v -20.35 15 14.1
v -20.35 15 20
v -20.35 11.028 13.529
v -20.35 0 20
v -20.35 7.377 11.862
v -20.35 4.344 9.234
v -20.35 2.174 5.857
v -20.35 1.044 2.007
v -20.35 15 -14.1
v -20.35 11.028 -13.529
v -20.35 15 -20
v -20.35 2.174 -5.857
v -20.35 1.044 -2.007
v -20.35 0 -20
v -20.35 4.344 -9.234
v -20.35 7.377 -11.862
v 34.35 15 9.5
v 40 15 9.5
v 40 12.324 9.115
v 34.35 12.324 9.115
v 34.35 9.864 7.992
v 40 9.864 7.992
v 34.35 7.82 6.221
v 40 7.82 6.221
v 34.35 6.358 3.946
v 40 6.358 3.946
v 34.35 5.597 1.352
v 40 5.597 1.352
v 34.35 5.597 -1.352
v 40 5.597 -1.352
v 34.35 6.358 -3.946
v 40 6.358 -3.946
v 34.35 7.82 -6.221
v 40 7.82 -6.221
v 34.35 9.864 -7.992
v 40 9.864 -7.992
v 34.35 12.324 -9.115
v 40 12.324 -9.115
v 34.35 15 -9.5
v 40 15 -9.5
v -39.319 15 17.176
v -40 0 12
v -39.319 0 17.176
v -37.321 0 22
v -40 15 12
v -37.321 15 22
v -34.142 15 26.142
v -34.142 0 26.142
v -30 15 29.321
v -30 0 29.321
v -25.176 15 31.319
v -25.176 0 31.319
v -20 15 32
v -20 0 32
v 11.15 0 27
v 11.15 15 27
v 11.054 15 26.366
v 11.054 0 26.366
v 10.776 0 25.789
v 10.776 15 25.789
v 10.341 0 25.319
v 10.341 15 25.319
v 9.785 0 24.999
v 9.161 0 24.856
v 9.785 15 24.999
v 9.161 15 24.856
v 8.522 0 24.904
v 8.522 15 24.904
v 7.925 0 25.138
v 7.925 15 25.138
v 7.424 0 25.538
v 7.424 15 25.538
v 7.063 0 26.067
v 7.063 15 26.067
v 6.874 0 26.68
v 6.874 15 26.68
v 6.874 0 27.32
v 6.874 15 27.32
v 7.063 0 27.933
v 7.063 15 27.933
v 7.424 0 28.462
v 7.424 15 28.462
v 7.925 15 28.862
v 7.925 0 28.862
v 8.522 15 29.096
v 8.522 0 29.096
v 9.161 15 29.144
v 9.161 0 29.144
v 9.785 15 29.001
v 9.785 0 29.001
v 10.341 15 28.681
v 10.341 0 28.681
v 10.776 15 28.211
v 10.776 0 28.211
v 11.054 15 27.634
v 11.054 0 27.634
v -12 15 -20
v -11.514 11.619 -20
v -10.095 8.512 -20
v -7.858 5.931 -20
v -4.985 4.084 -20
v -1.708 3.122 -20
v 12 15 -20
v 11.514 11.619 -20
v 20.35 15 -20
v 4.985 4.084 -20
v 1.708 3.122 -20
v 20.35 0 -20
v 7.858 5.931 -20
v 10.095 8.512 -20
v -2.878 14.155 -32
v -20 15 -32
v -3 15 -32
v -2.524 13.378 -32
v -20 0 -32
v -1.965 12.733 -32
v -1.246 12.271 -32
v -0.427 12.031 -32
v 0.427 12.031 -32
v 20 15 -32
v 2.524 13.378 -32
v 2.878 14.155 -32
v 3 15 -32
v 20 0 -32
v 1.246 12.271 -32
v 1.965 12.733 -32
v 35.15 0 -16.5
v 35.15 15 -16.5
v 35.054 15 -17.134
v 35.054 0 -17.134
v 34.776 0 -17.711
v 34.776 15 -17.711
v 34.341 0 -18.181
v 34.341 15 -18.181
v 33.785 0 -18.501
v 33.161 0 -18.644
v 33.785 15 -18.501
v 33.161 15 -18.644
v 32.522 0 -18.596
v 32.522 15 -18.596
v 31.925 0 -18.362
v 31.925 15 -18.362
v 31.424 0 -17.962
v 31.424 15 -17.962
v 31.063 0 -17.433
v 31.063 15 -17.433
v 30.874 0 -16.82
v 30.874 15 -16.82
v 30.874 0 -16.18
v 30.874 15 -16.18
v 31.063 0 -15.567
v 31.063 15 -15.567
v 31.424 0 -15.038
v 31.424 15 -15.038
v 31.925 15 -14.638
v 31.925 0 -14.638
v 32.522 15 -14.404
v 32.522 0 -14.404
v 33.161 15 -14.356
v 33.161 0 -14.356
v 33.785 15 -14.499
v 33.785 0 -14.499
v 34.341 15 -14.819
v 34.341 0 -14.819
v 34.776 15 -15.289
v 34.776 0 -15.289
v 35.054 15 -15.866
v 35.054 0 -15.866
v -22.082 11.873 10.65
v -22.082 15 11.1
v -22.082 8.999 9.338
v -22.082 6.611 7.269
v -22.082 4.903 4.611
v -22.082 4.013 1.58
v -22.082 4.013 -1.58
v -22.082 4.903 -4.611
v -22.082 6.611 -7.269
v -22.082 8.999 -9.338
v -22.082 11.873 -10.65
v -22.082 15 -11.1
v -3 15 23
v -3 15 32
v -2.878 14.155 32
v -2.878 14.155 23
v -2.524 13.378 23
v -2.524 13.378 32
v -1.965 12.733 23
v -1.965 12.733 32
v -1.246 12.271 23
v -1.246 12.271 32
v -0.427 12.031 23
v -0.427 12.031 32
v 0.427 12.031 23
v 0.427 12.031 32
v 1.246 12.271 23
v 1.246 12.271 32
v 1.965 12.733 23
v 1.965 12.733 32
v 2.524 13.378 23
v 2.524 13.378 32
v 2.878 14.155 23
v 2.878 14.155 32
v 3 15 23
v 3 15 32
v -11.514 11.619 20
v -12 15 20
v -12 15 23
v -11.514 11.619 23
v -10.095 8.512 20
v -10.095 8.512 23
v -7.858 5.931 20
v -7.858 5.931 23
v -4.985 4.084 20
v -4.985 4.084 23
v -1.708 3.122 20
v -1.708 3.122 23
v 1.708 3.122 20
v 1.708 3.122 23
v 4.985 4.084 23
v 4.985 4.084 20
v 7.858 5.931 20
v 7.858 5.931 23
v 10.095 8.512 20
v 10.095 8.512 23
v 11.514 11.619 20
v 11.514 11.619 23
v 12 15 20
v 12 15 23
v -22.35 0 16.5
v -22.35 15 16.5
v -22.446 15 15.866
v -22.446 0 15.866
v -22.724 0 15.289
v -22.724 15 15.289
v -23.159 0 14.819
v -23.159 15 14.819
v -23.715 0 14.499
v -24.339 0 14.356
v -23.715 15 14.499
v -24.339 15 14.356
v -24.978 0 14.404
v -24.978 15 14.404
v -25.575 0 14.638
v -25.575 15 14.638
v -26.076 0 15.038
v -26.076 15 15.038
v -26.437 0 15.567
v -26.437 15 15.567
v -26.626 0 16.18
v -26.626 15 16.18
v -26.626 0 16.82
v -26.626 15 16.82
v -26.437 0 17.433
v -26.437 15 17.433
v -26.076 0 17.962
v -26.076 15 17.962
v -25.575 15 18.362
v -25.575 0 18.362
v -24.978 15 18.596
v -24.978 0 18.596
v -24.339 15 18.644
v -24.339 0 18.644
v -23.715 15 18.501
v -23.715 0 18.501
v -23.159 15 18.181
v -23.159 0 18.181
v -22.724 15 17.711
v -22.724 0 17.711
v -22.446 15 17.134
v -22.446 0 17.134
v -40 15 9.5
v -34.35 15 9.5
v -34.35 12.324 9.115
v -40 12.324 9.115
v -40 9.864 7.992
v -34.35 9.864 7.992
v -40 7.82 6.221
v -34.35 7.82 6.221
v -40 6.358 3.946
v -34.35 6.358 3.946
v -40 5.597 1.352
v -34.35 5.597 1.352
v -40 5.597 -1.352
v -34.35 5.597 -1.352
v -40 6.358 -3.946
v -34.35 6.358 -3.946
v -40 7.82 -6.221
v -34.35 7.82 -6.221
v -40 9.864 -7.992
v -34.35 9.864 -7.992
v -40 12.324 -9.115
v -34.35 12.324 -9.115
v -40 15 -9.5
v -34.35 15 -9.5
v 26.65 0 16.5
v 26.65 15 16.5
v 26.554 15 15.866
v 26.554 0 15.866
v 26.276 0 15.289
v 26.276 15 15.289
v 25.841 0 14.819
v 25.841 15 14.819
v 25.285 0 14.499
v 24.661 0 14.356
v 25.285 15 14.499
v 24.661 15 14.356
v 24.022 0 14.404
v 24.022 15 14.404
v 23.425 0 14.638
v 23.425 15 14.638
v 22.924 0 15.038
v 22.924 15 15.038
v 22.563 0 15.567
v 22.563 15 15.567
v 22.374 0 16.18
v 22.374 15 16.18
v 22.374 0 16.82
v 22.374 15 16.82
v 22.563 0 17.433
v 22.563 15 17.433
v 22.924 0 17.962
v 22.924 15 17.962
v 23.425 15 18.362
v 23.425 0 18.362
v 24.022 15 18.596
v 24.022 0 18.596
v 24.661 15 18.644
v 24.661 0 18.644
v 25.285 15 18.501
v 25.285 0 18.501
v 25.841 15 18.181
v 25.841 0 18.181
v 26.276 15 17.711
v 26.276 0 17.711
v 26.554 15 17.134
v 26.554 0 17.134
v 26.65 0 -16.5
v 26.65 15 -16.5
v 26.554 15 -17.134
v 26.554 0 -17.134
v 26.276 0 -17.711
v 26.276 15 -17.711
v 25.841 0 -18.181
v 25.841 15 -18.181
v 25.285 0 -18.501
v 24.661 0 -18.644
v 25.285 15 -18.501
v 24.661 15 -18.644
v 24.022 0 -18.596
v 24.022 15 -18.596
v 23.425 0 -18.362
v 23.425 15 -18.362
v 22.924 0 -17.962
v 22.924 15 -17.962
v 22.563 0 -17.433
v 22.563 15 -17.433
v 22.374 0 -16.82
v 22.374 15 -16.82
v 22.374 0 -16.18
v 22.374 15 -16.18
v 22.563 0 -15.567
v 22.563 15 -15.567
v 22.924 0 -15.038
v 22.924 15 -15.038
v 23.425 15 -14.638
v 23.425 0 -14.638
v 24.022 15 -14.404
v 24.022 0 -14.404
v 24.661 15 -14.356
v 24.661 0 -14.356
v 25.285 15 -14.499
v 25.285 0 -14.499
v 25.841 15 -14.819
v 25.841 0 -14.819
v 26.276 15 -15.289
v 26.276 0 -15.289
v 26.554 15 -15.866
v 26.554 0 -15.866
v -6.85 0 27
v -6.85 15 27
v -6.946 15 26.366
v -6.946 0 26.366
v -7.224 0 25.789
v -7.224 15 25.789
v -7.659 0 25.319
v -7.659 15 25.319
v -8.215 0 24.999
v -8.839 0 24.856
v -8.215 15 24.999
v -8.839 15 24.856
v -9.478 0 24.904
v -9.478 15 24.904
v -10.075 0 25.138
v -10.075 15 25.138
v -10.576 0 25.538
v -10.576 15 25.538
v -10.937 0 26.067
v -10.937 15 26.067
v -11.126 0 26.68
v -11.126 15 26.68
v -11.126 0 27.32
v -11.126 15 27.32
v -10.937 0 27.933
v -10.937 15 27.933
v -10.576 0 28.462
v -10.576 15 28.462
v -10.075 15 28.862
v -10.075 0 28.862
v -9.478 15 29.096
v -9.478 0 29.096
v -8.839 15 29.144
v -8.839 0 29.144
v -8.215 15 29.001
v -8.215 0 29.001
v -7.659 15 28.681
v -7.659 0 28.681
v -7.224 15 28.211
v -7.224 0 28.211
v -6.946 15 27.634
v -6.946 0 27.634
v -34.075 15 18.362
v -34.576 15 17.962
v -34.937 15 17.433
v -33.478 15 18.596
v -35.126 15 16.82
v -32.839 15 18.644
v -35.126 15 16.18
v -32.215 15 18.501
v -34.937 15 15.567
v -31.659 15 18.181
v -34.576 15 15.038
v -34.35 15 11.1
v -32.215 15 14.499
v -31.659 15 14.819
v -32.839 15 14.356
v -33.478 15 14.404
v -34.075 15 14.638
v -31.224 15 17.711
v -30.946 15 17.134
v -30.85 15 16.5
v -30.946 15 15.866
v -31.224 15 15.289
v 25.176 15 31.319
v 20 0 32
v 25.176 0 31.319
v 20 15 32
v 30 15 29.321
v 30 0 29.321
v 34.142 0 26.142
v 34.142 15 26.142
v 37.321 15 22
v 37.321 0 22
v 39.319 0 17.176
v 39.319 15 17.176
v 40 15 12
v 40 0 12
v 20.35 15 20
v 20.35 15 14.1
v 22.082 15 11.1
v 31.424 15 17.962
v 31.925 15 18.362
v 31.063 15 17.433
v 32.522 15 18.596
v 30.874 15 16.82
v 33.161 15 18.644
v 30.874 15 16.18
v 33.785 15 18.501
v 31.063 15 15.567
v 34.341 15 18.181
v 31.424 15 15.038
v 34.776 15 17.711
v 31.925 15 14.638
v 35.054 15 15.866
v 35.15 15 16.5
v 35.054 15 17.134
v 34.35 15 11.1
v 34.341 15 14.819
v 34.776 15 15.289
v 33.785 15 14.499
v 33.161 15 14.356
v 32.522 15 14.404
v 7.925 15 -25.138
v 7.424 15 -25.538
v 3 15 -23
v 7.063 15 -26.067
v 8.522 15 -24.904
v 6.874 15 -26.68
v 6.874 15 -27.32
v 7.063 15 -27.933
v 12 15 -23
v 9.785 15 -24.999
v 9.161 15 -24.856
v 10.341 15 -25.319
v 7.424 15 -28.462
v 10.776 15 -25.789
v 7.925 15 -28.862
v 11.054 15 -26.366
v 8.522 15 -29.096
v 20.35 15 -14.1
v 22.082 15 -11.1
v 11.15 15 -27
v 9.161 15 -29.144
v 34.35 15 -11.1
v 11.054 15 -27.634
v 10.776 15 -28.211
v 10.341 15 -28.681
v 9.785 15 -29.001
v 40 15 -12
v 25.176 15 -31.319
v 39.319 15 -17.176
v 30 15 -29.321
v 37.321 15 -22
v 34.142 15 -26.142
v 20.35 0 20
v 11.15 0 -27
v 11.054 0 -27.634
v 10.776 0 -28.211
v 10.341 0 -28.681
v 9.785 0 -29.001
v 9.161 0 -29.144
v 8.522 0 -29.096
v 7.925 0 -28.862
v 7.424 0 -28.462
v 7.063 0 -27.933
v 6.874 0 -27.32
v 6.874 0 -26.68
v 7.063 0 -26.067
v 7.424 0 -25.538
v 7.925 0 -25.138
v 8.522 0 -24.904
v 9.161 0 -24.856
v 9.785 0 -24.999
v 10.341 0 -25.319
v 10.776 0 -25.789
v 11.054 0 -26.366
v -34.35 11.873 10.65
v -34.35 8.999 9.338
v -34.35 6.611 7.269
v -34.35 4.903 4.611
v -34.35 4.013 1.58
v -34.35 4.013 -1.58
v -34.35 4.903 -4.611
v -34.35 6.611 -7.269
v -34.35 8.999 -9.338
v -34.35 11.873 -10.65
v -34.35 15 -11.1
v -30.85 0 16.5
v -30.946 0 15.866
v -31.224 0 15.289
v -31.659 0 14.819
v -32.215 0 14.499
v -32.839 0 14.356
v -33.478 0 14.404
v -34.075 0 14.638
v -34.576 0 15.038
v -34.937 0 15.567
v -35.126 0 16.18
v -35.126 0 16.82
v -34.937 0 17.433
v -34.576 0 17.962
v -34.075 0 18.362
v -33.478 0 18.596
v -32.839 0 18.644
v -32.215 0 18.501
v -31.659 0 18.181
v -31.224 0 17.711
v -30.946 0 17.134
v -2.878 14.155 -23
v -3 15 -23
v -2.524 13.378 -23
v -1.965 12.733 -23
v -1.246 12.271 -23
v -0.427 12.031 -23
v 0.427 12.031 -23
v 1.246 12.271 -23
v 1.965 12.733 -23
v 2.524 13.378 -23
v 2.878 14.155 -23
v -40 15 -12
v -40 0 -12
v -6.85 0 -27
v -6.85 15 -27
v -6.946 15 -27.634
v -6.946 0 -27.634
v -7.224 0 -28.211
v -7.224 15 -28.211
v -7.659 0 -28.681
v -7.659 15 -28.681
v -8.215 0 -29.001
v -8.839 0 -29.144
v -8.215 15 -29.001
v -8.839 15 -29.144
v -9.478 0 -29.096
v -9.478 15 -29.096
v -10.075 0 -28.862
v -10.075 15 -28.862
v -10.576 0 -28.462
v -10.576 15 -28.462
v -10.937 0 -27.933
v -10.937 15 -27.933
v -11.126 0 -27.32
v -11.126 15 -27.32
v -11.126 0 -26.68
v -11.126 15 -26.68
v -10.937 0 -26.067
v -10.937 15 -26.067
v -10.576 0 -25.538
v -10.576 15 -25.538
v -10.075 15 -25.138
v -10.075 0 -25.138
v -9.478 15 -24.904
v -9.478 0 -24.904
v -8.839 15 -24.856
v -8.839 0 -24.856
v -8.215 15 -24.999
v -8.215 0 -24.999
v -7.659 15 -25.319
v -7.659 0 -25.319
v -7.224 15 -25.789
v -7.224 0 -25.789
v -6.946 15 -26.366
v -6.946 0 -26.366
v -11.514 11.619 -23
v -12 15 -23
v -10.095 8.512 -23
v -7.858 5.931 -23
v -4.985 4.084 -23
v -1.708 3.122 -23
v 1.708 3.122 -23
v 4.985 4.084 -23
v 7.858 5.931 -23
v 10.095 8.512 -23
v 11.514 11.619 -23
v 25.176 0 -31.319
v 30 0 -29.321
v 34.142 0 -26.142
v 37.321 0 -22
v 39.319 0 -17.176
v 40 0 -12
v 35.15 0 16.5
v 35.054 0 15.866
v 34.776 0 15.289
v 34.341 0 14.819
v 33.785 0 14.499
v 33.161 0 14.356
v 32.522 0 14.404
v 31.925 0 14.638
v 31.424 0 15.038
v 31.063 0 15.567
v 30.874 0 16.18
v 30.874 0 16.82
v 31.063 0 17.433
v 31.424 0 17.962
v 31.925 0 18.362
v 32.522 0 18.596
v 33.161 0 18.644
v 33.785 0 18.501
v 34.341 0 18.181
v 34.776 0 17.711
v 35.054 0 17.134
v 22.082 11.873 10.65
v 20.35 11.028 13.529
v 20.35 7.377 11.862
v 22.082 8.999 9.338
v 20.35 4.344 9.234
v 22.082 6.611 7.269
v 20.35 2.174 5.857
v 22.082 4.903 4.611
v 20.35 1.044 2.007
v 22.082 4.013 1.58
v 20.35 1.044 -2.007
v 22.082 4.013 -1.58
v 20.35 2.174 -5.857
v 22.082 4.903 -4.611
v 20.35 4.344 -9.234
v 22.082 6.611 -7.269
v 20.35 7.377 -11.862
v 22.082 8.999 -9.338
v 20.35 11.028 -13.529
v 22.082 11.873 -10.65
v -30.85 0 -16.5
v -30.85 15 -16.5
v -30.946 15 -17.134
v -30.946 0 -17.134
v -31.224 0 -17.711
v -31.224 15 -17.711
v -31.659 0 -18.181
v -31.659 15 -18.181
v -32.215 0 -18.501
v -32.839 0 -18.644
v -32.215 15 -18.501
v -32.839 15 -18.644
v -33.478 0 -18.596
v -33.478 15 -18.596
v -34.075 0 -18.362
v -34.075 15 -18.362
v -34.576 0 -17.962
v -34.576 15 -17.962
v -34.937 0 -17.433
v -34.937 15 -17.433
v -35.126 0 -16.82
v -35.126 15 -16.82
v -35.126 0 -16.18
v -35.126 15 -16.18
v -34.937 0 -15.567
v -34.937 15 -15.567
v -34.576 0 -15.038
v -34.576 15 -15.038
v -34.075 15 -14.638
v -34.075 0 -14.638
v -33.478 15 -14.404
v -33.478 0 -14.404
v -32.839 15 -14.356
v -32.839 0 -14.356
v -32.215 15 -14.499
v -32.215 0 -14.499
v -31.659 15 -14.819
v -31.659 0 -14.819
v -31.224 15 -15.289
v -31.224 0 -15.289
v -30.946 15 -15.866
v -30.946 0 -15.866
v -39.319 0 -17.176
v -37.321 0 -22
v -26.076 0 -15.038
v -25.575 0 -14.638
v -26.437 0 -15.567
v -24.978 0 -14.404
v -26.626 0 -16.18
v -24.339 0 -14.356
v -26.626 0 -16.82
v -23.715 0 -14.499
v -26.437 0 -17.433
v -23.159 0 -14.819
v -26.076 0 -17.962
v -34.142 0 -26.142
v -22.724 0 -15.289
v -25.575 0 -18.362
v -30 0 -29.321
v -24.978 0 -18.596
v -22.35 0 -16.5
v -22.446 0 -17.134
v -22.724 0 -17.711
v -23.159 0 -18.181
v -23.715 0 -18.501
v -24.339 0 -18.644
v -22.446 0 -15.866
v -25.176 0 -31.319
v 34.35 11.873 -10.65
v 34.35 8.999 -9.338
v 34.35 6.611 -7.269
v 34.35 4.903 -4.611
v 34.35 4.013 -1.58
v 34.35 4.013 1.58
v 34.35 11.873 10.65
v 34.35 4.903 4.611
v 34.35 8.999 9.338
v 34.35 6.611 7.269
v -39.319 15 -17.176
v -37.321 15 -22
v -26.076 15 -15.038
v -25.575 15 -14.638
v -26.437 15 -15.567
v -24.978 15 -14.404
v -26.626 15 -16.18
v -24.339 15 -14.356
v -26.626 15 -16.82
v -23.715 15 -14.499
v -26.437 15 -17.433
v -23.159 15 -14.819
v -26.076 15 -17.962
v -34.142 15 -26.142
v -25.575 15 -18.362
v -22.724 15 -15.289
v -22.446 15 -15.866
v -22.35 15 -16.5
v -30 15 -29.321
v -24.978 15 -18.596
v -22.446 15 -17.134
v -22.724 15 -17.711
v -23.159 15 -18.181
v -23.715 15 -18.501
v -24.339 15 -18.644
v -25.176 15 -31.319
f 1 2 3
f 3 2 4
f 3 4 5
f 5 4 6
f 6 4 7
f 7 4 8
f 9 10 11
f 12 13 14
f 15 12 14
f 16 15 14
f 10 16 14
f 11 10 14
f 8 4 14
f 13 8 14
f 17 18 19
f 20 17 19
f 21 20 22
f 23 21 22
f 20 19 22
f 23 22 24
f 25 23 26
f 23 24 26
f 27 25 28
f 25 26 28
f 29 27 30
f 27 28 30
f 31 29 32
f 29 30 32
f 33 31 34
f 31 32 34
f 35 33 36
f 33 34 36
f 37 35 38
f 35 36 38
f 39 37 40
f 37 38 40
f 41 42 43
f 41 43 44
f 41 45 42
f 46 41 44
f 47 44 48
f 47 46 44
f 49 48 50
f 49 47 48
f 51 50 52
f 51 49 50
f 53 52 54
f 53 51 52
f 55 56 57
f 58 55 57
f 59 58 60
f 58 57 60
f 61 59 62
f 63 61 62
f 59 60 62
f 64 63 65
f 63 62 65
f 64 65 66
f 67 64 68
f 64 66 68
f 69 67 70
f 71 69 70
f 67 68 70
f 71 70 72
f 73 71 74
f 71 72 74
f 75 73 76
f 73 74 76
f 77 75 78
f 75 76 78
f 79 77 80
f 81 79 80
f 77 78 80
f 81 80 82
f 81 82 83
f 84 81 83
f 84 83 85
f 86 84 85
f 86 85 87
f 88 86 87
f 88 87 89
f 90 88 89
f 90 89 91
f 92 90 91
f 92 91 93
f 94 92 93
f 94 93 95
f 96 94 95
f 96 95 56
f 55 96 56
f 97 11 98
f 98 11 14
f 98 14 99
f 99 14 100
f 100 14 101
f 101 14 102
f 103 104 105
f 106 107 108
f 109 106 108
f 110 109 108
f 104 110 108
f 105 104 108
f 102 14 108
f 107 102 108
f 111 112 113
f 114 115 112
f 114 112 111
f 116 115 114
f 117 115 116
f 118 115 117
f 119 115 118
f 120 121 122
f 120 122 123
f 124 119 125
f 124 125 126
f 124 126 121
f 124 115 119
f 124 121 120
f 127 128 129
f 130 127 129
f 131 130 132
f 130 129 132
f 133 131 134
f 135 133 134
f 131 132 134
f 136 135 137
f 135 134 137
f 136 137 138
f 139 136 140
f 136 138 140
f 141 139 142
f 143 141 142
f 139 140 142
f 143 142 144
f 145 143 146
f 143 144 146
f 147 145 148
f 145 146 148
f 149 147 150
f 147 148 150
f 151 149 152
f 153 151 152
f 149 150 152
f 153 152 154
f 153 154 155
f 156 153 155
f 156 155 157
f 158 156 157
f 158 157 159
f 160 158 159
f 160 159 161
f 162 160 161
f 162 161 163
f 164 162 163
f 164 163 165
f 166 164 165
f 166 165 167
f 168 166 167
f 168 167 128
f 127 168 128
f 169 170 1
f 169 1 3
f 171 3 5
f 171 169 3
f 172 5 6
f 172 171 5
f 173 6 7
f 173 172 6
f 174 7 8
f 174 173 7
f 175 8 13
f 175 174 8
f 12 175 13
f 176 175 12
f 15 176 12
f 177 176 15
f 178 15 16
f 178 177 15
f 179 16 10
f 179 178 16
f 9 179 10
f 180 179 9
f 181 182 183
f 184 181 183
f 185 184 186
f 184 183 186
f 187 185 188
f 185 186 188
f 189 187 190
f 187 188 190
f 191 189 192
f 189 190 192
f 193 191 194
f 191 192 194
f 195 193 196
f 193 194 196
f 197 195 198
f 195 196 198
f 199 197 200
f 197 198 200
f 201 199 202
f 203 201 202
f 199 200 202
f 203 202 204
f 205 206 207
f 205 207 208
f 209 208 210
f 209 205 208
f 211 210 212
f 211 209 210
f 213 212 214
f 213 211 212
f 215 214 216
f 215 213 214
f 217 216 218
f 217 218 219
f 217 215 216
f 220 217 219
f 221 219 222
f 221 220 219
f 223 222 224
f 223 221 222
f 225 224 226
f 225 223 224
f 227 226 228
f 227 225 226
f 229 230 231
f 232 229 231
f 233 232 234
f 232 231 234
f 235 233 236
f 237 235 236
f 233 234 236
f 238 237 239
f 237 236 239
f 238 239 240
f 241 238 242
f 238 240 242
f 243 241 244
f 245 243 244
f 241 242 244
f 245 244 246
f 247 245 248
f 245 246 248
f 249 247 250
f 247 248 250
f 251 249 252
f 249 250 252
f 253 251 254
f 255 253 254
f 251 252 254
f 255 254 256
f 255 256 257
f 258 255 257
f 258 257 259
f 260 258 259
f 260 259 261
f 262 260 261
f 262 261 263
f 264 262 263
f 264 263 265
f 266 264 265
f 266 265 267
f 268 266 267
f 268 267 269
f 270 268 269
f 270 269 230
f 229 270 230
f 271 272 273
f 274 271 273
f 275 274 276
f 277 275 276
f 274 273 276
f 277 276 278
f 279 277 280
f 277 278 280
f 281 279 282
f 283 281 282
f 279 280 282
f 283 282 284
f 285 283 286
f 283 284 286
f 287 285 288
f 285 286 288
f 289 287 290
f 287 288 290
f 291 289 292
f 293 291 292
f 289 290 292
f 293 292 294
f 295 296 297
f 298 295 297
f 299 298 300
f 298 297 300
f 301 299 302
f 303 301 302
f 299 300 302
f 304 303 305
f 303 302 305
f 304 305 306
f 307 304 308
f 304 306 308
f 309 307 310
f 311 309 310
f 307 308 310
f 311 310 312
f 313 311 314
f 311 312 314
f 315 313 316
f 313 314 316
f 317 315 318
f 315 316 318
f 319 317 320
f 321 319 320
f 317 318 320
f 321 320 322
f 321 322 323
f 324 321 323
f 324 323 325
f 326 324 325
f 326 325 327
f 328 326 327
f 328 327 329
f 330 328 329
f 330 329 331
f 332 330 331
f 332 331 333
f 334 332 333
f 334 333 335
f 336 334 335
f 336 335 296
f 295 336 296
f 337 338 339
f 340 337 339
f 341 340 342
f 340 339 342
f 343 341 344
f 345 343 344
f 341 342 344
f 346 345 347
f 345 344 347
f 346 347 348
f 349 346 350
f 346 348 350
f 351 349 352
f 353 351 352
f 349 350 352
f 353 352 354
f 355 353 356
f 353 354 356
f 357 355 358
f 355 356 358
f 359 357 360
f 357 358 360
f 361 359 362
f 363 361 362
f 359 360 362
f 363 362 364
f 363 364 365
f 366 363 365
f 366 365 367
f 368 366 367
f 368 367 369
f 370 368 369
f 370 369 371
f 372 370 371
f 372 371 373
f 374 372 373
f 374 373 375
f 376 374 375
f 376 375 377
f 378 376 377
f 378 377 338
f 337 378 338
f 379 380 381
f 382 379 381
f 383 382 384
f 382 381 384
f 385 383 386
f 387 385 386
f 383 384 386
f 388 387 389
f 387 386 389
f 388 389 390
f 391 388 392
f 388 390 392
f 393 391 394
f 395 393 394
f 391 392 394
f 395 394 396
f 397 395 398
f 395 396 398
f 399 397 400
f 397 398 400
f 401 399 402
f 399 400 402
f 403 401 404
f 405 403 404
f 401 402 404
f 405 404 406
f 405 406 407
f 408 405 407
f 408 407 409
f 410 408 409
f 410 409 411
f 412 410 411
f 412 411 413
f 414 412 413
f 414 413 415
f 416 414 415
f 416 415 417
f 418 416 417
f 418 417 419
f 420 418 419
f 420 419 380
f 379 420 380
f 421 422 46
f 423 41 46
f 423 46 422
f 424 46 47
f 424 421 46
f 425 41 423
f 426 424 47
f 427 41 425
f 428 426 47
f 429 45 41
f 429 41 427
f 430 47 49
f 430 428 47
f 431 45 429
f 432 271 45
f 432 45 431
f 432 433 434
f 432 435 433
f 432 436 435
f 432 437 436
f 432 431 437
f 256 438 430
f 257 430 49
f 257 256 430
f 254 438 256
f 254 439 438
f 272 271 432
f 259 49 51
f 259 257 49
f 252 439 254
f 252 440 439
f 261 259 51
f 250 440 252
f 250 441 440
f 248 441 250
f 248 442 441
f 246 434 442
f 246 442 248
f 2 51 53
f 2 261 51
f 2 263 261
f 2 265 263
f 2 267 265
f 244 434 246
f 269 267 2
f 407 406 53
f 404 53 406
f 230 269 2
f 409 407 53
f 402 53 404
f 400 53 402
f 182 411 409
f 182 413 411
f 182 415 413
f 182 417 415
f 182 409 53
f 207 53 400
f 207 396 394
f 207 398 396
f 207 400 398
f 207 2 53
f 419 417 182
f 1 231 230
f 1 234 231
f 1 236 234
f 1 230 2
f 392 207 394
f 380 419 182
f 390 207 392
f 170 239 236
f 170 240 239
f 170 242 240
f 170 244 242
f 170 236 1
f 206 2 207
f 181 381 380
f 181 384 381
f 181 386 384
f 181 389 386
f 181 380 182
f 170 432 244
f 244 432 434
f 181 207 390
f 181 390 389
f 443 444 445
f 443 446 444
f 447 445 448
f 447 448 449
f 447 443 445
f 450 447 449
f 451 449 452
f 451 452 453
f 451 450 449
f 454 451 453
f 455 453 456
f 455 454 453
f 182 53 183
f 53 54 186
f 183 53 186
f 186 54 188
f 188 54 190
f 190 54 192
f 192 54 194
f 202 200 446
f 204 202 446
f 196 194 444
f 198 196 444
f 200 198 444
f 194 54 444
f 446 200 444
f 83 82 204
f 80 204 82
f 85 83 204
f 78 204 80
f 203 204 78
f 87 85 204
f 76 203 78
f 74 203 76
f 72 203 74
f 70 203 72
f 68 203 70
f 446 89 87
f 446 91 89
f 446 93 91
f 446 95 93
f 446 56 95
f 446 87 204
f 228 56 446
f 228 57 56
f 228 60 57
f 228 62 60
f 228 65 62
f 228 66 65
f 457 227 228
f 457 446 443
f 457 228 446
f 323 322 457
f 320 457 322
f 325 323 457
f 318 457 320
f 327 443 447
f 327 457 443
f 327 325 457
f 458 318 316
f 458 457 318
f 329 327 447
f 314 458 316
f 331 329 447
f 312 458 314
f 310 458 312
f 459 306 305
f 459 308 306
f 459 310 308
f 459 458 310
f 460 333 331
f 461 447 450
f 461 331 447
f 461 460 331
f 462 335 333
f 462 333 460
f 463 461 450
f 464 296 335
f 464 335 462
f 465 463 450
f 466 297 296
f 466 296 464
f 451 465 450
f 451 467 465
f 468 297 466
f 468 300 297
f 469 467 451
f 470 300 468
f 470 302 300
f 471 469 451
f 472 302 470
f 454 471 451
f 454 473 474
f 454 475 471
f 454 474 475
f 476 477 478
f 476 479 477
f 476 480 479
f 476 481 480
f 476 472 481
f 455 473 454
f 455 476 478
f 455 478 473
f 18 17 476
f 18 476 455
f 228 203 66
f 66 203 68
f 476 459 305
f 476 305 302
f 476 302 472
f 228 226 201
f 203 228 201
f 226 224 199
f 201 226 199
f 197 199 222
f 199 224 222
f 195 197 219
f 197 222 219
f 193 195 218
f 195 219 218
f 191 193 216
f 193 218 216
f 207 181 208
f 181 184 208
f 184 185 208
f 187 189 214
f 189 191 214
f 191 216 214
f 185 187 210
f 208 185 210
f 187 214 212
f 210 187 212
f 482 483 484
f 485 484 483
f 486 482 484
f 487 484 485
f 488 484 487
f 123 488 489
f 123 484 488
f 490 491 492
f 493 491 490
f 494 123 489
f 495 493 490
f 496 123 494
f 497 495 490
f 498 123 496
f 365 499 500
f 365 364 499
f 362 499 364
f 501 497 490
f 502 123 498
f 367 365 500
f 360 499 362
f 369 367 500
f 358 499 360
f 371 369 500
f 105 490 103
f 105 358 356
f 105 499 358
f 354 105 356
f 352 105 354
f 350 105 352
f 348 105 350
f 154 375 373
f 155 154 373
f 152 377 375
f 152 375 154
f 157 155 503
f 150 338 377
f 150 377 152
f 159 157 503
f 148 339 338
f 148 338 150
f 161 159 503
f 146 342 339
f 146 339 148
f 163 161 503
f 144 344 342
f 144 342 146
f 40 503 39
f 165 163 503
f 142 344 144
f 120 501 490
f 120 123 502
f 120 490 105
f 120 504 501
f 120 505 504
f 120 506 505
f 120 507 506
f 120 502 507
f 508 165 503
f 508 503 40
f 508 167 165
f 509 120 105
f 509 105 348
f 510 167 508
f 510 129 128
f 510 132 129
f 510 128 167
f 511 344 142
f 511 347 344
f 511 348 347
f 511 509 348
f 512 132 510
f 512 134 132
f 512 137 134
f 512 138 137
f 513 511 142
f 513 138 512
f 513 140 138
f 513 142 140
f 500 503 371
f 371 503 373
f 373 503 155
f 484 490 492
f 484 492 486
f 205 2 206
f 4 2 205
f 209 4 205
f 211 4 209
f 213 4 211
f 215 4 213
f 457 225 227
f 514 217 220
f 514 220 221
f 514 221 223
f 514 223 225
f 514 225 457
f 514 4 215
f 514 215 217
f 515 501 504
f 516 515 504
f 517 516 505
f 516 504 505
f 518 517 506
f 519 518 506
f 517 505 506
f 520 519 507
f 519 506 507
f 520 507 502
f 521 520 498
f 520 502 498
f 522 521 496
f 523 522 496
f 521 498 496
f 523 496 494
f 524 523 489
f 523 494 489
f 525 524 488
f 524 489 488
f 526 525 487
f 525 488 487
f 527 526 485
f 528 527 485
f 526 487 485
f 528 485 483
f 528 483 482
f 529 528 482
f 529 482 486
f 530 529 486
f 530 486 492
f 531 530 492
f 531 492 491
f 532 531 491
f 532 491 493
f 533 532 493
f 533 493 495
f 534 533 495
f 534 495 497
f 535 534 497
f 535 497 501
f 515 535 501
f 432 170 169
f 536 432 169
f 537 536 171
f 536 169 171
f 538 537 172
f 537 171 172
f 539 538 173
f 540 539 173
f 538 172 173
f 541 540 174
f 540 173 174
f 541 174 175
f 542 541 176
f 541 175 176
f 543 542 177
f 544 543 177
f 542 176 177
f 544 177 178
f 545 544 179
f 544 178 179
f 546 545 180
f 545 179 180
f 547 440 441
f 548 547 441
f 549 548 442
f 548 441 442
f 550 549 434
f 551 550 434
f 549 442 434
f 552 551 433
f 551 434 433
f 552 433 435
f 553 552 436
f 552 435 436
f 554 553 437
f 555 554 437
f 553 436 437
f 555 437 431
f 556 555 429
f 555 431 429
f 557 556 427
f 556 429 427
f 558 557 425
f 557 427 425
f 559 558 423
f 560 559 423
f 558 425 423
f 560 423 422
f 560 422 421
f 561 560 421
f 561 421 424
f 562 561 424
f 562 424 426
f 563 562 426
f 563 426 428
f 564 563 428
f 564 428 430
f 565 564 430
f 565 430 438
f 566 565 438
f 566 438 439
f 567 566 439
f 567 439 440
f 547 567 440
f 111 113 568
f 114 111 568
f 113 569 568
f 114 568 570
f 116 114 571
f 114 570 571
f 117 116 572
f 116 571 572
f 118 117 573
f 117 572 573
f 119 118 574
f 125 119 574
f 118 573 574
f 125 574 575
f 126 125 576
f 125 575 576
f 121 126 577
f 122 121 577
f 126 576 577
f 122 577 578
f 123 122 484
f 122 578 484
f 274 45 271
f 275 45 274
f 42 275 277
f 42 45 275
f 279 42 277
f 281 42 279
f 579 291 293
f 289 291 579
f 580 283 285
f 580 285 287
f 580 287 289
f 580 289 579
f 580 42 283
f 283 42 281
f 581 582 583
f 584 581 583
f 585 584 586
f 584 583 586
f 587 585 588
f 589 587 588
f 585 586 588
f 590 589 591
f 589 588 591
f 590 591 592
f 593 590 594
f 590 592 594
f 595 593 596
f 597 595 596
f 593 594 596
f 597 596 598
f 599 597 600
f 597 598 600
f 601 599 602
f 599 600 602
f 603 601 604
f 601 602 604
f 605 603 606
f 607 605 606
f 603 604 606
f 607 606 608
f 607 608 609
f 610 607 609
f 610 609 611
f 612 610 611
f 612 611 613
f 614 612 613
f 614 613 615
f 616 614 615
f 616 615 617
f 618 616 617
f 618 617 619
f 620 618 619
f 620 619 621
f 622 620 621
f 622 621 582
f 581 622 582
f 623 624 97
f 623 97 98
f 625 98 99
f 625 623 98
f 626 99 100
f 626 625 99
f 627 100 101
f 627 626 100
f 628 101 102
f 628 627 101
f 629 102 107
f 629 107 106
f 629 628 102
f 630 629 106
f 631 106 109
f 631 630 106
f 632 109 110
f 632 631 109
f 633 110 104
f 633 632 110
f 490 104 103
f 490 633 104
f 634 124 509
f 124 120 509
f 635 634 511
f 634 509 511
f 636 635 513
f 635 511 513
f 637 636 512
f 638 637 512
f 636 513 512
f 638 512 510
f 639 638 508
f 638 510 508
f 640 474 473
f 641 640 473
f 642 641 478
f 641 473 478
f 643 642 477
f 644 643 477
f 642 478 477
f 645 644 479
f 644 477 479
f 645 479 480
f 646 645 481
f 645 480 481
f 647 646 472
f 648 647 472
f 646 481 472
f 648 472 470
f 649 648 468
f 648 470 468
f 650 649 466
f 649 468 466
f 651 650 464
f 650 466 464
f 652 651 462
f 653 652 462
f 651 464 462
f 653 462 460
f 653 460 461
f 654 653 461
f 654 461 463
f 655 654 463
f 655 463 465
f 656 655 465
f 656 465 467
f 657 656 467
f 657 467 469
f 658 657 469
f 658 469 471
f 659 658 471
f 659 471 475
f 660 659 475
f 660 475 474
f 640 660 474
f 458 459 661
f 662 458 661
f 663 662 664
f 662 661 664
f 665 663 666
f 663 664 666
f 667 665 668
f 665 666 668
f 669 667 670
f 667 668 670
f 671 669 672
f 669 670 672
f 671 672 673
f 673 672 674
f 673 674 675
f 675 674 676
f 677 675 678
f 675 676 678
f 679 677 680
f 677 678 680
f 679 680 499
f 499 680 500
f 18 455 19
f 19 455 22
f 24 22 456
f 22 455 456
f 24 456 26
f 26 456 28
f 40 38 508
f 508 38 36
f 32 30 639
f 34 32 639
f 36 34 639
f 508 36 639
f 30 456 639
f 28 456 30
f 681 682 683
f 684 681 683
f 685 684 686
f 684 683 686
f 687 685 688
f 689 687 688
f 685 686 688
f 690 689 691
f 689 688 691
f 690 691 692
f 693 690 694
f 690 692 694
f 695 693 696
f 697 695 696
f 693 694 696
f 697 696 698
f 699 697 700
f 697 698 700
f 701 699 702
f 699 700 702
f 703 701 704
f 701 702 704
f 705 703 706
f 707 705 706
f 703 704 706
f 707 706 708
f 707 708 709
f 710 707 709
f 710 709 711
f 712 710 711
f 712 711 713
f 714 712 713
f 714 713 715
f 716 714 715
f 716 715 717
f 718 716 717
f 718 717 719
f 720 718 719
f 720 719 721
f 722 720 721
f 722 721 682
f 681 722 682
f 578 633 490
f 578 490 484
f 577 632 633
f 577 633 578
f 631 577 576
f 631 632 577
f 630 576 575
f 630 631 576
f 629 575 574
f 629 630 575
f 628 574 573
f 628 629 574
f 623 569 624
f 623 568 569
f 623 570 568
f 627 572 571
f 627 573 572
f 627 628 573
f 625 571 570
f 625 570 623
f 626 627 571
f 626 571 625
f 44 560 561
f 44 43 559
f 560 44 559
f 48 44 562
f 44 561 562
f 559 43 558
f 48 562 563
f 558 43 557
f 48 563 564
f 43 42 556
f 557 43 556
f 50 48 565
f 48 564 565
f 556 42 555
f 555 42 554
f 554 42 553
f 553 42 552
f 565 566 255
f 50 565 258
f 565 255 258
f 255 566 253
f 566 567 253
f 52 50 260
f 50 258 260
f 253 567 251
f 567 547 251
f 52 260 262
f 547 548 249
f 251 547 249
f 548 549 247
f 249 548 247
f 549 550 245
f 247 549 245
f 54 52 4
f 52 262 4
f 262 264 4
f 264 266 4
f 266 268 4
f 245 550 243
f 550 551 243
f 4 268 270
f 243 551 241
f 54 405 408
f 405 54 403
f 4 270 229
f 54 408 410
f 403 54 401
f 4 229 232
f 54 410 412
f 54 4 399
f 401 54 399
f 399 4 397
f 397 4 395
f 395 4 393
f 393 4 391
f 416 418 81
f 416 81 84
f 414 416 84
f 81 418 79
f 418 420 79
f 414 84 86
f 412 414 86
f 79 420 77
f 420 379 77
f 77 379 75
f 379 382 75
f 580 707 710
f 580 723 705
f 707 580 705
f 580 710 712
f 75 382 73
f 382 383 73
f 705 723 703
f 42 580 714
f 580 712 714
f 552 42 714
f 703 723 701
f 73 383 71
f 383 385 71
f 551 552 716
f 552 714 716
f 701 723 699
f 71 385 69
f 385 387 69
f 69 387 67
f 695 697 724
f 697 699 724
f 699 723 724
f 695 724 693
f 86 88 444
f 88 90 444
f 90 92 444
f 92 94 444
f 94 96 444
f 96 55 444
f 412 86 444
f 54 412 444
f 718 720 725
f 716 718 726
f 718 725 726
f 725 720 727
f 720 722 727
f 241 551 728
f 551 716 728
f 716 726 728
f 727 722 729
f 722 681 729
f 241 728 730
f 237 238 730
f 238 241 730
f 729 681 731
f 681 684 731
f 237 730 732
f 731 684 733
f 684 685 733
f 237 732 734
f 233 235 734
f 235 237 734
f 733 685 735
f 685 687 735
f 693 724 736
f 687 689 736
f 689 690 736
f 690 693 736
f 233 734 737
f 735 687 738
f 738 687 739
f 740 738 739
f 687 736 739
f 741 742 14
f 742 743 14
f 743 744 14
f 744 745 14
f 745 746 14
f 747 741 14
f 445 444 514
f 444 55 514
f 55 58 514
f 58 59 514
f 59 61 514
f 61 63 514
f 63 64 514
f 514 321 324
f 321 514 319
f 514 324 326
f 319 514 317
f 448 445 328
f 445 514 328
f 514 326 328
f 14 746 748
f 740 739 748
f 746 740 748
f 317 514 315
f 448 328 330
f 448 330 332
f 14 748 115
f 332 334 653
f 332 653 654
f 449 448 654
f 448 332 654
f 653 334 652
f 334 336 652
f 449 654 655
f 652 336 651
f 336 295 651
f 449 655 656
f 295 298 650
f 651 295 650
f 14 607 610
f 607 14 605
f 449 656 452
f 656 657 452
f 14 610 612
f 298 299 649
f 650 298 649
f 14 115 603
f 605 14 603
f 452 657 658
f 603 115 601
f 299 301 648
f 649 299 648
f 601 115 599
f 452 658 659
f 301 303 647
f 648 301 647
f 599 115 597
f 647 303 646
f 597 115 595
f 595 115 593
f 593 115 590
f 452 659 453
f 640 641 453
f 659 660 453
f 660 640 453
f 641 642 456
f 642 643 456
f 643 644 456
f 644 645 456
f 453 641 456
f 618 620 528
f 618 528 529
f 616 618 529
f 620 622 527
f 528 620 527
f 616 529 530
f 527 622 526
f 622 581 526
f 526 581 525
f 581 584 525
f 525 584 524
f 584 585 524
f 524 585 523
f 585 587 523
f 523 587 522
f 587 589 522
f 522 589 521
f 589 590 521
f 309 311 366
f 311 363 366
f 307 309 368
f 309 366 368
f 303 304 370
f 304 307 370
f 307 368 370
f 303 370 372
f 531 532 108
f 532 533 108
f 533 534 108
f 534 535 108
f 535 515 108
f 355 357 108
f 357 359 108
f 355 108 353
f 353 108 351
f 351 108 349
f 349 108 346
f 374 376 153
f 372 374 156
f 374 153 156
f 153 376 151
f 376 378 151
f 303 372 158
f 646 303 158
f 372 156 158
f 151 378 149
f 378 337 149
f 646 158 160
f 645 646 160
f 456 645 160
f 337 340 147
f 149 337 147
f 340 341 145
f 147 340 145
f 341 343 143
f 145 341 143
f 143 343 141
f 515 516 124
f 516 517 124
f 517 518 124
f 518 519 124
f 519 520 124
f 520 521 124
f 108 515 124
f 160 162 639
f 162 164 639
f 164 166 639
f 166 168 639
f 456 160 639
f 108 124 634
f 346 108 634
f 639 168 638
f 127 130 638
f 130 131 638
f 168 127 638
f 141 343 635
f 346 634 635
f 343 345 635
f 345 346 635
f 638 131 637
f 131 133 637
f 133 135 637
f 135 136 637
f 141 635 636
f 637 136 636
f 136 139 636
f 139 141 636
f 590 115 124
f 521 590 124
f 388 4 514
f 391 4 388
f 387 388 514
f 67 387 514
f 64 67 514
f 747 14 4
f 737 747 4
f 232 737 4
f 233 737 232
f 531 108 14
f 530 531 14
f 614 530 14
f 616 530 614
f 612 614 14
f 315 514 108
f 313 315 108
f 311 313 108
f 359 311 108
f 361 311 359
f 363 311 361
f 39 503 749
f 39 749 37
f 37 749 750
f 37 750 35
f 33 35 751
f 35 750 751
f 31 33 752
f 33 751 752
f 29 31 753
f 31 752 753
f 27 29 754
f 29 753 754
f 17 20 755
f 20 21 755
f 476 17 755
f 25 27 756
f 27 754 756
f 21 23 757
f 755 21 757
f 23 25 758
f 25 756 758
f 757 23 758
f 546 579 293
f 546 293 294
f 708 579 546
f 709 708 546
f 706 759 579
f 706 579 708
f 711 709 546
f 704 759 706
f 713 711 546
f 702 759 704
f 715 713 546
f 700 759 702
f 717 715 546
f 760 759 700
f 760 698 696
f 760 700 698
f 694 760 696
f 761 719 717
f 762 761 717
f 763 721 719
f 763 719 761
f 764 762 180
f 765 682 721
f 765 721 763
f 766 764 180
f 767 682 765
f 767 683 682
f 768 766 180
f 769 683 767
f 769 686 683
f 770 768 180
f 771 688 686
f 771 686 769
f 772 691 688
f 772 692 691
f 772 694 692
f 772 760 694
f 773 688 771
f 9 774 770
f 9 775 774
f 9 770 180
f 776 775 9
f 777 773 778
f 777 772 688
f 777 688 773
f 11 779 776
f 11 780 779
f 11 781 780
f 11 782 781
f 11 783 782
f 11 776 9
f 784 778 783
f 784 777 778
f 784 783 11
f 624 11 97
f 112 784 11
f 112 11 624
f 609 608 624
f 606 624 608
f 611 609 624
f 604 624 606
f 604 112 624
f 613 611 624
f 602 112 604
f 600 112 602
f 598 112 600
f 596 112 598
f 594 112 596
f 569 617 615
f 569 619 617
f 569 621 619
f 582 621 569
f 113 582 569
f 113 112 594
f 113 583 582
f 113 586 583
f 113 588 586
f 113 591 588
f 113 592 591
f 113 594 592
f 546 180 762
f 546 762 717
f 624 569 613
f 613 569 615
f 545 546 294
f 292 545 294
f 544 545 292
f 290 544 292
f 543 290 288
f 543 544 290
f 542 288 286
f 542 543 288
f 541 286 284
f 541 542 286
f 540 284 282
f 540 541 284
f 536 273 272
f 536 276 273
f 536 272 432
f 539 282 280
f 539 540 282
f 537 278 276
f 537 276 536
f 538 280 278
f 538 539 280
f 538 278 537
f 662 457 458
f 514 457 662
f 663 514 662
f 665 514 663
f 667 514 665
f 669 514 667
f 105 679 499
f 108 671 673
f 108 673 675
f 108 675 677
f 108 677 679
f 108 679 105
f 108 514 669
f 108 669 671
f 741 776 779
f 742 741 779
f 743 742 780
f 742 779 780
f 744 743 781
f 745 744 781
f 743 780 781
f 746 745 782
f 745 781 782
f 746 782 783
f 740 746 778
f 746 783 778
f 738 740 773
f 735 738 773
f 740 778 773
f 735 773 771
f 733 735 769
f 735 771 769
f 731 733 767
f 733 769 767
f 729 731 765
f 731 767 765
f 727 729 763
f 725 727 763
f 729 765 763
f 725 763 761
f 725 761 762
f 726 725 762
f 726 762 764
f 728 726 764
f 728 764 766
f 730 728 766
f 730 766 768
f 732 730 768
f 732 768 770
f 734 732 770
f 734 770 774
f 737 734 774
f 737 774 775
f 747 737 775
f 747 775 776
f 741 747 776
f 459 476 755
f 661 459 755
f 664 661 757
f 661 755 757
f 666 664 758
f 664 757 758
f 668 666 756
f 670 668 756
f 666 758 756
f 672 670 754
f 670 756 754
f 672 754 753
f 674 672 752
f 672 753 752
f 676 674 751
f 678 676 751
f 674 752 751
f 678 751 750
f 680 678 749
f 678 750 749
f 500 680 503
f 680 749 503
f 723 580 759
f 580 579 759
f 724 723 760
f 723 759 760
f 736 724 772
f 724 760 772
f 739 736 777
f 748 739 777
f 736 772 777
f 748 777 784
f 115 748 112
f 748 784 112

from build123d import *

# Parameters (mm, degrees)
SKETCH1_W             = 80
SKETCH1_H             = 64
SKETCH1_W_2           = 40.7
SKETCH1_H_2           = 40
BOSS_EXTRUDE1_DEPTH   = 15
SKETCH3_W             = 14
SKETCH3_H             = 11.1
SKETCH4_R             = 9.5
CUT_EXTRUDE2_DEPTH    = 81
SKETCH5_R             = 3
CUT_EXTRUDE3_DEPTH    = 65
SKETCH8_R             = 2.15
CUT_EXTRUDE6_DEPTH    = 16
FILLET1_R             = 20
CHAMFER1_SIZE         = 3
CHAMFER1_SIZE2        = 1.732050808
CHAMFER1_PART_2_SIZE  = 3
CHAMFER1_PART_2_SIZE2 = 1.732050808
SKETCH9_W             = 12
SKETCH9_H             = 3


with BuildPart() as part:
    # Sketch1 → Boss-Extrude1 (new body)
    with BuildSketch(Plane(origin=(0, 0, 0), x_dir=(1, 0, 0), z_dir=(0, 1, 0))):
        Rectangle(SKETCH1_W, SKETCH1_H)
        Rectangle(SKETCH1_W_2, SKETCH1_H_2, mode=Mode.SUBTRACT)
    extrude(amount=BOSS_EXTRUDE1_DEPTH)

    # Sketch3 → Cut-Revolve1 (revolve, cut)
    with BuildSketch(Plane(origin=(0, 15, 0), x_dir=(1, 0, 0), z_dir=(0, 1, 0))):
        with Locations((27.35, -5.55)):
            Rectangle(SKETCH3_W, SKETCH3_H)
        with Locations((-27.35, -5.55)):
            Rectangle(SKETCH3_W, SKETCH3_H)
    revolve(axis=Axis((20.35, 15, 0), (1, 0, 0)), mode=Mode.SUBTRACT)

    # Sketch4 → Cut-Extrude2 (cut, through all)
    with BuildSketch(Plane(origin=(40, 0, 0), x_dir=(0, 0, -1), z_dir=(1, 0, 0))):
        with Locations((0, 15)):
            Circle(SKETCH4_R)
    extrude(amount=-CUT_EXTRUDE2_DEPTH, mode=Mode.SUBTRACT)

    # Sketch5 → Cut-Extrude3 (cut, through all)
    with BuildSketch(Plane.XY.offset(32)):
        with Locations((0, 15)):
            Circle(SKETCH5_R)
    extrude(amount=-CUT_EXTRUDE3_DEPTH, mode=Mode.SUBTRACT)

    # Sketch8 → Cut-Extrude6 (cut, through all)
    with BuildSketch(Plane(origin=(0, 15, 0), x_dir=(1, 0, 0), z_dir=(0, 1, 0))):
        with Locations((24.5, 16.5)):
            Circle(SKETCH8_R)
        with Locations((24.5, -16.5)):
            Circle(SKETCH8_R)
        with Locations((-24.5, -16.5)):
            Circle(SKETCH8_R)
        with Locations((-24.5, 16.5)):
            Circle(SKETCH8_R)
        with Locations((9, -27)):
            Circle(SKETCH8_R)
        with Locations((-9, -27)):
            Circle(SKETCH8_R)
        with Locations((-9, 27)):
            Circle(SKETCH8_R)
        with Locations((9, 27)):
            Circle(SKETCH8_R)
        with Locations((-33, 16.5)):
            Circle(SKETCH8_R)
        with Locations((33, 16.5)):
            Circle(SKETCH8_R)
        with Locations((33, -16.5)):
            Circle(SKETCH8_R)
        with Locations((-33, -16.5)):
            Circle(SKETCH8_R)
    extrude(amount=-CUT_EXTRUDE6_DEPTH, mode=Mode.SUBTRACT)

    # Fillet1
    fillet1_edges = [part.edges().sort_by_distance(p)[0] for p in [
        (-40, 7.5, -32),
        (40, 7.5, -32),
        (40, 7.5, 32),
        (-40, 7.5, 32),
    ]]
    fillet(fillet1_edges, radius=FILLET1_R)

    # Chamfer1
    chamfer1_edges = [part.edges().sort_by_distance(p)[0] for p in [
        (20.35, 3.9, 0),
    ]]
    chamfer1_side = [part.faces().sort_by_distance(p)[0] for p in [
        (20.35, 0.427200187, 0),
    ]]
    chamfer(chamfer1_edges, length=CHAMFER1_SIZE, length2=CHAMFER1_SIZE2, reference=chamfer1_side[0])

    # Chamfer1 part 2
    chamfer1_part_2_edges = [part.edges().sort_by_distance(p)[0] for p in [
        (-20.35, 3.9, 0),
    ]]
    chamfer1_part_2_side = [part.faces().sort_by_distance(p)[0] for p in [
        (-20.35, 0.427200187, 0),
    ]]
    chamfer(chamfer1_part_2_edges, length=CHAMFER1_PART_2_SIZE, length2=CHAMFER1_PART_2_SIZE2, reference=chamfer1_part_2_side[0])

    # Sketch9 → Cut-Revolve2 (revolve, cut)
    with BuildSketch(Plane(origin=(0, 15, 0), x_dir=(1, 0, 0), z_dir=(0, 1, 0))):
        with Locations((-6, -21.5)):
            Rectangle(SKETCH9_W, SKETCH9_H)
        with Locations((-6, 21.5)):
            Rectangle(SKETCH9_W, SKETCH9_H)
    revolve(axis=Axis((0, 15, -29.871415895), (0, 0, 1)), mode=Mode.SUBTRACT)


solid = part.part
